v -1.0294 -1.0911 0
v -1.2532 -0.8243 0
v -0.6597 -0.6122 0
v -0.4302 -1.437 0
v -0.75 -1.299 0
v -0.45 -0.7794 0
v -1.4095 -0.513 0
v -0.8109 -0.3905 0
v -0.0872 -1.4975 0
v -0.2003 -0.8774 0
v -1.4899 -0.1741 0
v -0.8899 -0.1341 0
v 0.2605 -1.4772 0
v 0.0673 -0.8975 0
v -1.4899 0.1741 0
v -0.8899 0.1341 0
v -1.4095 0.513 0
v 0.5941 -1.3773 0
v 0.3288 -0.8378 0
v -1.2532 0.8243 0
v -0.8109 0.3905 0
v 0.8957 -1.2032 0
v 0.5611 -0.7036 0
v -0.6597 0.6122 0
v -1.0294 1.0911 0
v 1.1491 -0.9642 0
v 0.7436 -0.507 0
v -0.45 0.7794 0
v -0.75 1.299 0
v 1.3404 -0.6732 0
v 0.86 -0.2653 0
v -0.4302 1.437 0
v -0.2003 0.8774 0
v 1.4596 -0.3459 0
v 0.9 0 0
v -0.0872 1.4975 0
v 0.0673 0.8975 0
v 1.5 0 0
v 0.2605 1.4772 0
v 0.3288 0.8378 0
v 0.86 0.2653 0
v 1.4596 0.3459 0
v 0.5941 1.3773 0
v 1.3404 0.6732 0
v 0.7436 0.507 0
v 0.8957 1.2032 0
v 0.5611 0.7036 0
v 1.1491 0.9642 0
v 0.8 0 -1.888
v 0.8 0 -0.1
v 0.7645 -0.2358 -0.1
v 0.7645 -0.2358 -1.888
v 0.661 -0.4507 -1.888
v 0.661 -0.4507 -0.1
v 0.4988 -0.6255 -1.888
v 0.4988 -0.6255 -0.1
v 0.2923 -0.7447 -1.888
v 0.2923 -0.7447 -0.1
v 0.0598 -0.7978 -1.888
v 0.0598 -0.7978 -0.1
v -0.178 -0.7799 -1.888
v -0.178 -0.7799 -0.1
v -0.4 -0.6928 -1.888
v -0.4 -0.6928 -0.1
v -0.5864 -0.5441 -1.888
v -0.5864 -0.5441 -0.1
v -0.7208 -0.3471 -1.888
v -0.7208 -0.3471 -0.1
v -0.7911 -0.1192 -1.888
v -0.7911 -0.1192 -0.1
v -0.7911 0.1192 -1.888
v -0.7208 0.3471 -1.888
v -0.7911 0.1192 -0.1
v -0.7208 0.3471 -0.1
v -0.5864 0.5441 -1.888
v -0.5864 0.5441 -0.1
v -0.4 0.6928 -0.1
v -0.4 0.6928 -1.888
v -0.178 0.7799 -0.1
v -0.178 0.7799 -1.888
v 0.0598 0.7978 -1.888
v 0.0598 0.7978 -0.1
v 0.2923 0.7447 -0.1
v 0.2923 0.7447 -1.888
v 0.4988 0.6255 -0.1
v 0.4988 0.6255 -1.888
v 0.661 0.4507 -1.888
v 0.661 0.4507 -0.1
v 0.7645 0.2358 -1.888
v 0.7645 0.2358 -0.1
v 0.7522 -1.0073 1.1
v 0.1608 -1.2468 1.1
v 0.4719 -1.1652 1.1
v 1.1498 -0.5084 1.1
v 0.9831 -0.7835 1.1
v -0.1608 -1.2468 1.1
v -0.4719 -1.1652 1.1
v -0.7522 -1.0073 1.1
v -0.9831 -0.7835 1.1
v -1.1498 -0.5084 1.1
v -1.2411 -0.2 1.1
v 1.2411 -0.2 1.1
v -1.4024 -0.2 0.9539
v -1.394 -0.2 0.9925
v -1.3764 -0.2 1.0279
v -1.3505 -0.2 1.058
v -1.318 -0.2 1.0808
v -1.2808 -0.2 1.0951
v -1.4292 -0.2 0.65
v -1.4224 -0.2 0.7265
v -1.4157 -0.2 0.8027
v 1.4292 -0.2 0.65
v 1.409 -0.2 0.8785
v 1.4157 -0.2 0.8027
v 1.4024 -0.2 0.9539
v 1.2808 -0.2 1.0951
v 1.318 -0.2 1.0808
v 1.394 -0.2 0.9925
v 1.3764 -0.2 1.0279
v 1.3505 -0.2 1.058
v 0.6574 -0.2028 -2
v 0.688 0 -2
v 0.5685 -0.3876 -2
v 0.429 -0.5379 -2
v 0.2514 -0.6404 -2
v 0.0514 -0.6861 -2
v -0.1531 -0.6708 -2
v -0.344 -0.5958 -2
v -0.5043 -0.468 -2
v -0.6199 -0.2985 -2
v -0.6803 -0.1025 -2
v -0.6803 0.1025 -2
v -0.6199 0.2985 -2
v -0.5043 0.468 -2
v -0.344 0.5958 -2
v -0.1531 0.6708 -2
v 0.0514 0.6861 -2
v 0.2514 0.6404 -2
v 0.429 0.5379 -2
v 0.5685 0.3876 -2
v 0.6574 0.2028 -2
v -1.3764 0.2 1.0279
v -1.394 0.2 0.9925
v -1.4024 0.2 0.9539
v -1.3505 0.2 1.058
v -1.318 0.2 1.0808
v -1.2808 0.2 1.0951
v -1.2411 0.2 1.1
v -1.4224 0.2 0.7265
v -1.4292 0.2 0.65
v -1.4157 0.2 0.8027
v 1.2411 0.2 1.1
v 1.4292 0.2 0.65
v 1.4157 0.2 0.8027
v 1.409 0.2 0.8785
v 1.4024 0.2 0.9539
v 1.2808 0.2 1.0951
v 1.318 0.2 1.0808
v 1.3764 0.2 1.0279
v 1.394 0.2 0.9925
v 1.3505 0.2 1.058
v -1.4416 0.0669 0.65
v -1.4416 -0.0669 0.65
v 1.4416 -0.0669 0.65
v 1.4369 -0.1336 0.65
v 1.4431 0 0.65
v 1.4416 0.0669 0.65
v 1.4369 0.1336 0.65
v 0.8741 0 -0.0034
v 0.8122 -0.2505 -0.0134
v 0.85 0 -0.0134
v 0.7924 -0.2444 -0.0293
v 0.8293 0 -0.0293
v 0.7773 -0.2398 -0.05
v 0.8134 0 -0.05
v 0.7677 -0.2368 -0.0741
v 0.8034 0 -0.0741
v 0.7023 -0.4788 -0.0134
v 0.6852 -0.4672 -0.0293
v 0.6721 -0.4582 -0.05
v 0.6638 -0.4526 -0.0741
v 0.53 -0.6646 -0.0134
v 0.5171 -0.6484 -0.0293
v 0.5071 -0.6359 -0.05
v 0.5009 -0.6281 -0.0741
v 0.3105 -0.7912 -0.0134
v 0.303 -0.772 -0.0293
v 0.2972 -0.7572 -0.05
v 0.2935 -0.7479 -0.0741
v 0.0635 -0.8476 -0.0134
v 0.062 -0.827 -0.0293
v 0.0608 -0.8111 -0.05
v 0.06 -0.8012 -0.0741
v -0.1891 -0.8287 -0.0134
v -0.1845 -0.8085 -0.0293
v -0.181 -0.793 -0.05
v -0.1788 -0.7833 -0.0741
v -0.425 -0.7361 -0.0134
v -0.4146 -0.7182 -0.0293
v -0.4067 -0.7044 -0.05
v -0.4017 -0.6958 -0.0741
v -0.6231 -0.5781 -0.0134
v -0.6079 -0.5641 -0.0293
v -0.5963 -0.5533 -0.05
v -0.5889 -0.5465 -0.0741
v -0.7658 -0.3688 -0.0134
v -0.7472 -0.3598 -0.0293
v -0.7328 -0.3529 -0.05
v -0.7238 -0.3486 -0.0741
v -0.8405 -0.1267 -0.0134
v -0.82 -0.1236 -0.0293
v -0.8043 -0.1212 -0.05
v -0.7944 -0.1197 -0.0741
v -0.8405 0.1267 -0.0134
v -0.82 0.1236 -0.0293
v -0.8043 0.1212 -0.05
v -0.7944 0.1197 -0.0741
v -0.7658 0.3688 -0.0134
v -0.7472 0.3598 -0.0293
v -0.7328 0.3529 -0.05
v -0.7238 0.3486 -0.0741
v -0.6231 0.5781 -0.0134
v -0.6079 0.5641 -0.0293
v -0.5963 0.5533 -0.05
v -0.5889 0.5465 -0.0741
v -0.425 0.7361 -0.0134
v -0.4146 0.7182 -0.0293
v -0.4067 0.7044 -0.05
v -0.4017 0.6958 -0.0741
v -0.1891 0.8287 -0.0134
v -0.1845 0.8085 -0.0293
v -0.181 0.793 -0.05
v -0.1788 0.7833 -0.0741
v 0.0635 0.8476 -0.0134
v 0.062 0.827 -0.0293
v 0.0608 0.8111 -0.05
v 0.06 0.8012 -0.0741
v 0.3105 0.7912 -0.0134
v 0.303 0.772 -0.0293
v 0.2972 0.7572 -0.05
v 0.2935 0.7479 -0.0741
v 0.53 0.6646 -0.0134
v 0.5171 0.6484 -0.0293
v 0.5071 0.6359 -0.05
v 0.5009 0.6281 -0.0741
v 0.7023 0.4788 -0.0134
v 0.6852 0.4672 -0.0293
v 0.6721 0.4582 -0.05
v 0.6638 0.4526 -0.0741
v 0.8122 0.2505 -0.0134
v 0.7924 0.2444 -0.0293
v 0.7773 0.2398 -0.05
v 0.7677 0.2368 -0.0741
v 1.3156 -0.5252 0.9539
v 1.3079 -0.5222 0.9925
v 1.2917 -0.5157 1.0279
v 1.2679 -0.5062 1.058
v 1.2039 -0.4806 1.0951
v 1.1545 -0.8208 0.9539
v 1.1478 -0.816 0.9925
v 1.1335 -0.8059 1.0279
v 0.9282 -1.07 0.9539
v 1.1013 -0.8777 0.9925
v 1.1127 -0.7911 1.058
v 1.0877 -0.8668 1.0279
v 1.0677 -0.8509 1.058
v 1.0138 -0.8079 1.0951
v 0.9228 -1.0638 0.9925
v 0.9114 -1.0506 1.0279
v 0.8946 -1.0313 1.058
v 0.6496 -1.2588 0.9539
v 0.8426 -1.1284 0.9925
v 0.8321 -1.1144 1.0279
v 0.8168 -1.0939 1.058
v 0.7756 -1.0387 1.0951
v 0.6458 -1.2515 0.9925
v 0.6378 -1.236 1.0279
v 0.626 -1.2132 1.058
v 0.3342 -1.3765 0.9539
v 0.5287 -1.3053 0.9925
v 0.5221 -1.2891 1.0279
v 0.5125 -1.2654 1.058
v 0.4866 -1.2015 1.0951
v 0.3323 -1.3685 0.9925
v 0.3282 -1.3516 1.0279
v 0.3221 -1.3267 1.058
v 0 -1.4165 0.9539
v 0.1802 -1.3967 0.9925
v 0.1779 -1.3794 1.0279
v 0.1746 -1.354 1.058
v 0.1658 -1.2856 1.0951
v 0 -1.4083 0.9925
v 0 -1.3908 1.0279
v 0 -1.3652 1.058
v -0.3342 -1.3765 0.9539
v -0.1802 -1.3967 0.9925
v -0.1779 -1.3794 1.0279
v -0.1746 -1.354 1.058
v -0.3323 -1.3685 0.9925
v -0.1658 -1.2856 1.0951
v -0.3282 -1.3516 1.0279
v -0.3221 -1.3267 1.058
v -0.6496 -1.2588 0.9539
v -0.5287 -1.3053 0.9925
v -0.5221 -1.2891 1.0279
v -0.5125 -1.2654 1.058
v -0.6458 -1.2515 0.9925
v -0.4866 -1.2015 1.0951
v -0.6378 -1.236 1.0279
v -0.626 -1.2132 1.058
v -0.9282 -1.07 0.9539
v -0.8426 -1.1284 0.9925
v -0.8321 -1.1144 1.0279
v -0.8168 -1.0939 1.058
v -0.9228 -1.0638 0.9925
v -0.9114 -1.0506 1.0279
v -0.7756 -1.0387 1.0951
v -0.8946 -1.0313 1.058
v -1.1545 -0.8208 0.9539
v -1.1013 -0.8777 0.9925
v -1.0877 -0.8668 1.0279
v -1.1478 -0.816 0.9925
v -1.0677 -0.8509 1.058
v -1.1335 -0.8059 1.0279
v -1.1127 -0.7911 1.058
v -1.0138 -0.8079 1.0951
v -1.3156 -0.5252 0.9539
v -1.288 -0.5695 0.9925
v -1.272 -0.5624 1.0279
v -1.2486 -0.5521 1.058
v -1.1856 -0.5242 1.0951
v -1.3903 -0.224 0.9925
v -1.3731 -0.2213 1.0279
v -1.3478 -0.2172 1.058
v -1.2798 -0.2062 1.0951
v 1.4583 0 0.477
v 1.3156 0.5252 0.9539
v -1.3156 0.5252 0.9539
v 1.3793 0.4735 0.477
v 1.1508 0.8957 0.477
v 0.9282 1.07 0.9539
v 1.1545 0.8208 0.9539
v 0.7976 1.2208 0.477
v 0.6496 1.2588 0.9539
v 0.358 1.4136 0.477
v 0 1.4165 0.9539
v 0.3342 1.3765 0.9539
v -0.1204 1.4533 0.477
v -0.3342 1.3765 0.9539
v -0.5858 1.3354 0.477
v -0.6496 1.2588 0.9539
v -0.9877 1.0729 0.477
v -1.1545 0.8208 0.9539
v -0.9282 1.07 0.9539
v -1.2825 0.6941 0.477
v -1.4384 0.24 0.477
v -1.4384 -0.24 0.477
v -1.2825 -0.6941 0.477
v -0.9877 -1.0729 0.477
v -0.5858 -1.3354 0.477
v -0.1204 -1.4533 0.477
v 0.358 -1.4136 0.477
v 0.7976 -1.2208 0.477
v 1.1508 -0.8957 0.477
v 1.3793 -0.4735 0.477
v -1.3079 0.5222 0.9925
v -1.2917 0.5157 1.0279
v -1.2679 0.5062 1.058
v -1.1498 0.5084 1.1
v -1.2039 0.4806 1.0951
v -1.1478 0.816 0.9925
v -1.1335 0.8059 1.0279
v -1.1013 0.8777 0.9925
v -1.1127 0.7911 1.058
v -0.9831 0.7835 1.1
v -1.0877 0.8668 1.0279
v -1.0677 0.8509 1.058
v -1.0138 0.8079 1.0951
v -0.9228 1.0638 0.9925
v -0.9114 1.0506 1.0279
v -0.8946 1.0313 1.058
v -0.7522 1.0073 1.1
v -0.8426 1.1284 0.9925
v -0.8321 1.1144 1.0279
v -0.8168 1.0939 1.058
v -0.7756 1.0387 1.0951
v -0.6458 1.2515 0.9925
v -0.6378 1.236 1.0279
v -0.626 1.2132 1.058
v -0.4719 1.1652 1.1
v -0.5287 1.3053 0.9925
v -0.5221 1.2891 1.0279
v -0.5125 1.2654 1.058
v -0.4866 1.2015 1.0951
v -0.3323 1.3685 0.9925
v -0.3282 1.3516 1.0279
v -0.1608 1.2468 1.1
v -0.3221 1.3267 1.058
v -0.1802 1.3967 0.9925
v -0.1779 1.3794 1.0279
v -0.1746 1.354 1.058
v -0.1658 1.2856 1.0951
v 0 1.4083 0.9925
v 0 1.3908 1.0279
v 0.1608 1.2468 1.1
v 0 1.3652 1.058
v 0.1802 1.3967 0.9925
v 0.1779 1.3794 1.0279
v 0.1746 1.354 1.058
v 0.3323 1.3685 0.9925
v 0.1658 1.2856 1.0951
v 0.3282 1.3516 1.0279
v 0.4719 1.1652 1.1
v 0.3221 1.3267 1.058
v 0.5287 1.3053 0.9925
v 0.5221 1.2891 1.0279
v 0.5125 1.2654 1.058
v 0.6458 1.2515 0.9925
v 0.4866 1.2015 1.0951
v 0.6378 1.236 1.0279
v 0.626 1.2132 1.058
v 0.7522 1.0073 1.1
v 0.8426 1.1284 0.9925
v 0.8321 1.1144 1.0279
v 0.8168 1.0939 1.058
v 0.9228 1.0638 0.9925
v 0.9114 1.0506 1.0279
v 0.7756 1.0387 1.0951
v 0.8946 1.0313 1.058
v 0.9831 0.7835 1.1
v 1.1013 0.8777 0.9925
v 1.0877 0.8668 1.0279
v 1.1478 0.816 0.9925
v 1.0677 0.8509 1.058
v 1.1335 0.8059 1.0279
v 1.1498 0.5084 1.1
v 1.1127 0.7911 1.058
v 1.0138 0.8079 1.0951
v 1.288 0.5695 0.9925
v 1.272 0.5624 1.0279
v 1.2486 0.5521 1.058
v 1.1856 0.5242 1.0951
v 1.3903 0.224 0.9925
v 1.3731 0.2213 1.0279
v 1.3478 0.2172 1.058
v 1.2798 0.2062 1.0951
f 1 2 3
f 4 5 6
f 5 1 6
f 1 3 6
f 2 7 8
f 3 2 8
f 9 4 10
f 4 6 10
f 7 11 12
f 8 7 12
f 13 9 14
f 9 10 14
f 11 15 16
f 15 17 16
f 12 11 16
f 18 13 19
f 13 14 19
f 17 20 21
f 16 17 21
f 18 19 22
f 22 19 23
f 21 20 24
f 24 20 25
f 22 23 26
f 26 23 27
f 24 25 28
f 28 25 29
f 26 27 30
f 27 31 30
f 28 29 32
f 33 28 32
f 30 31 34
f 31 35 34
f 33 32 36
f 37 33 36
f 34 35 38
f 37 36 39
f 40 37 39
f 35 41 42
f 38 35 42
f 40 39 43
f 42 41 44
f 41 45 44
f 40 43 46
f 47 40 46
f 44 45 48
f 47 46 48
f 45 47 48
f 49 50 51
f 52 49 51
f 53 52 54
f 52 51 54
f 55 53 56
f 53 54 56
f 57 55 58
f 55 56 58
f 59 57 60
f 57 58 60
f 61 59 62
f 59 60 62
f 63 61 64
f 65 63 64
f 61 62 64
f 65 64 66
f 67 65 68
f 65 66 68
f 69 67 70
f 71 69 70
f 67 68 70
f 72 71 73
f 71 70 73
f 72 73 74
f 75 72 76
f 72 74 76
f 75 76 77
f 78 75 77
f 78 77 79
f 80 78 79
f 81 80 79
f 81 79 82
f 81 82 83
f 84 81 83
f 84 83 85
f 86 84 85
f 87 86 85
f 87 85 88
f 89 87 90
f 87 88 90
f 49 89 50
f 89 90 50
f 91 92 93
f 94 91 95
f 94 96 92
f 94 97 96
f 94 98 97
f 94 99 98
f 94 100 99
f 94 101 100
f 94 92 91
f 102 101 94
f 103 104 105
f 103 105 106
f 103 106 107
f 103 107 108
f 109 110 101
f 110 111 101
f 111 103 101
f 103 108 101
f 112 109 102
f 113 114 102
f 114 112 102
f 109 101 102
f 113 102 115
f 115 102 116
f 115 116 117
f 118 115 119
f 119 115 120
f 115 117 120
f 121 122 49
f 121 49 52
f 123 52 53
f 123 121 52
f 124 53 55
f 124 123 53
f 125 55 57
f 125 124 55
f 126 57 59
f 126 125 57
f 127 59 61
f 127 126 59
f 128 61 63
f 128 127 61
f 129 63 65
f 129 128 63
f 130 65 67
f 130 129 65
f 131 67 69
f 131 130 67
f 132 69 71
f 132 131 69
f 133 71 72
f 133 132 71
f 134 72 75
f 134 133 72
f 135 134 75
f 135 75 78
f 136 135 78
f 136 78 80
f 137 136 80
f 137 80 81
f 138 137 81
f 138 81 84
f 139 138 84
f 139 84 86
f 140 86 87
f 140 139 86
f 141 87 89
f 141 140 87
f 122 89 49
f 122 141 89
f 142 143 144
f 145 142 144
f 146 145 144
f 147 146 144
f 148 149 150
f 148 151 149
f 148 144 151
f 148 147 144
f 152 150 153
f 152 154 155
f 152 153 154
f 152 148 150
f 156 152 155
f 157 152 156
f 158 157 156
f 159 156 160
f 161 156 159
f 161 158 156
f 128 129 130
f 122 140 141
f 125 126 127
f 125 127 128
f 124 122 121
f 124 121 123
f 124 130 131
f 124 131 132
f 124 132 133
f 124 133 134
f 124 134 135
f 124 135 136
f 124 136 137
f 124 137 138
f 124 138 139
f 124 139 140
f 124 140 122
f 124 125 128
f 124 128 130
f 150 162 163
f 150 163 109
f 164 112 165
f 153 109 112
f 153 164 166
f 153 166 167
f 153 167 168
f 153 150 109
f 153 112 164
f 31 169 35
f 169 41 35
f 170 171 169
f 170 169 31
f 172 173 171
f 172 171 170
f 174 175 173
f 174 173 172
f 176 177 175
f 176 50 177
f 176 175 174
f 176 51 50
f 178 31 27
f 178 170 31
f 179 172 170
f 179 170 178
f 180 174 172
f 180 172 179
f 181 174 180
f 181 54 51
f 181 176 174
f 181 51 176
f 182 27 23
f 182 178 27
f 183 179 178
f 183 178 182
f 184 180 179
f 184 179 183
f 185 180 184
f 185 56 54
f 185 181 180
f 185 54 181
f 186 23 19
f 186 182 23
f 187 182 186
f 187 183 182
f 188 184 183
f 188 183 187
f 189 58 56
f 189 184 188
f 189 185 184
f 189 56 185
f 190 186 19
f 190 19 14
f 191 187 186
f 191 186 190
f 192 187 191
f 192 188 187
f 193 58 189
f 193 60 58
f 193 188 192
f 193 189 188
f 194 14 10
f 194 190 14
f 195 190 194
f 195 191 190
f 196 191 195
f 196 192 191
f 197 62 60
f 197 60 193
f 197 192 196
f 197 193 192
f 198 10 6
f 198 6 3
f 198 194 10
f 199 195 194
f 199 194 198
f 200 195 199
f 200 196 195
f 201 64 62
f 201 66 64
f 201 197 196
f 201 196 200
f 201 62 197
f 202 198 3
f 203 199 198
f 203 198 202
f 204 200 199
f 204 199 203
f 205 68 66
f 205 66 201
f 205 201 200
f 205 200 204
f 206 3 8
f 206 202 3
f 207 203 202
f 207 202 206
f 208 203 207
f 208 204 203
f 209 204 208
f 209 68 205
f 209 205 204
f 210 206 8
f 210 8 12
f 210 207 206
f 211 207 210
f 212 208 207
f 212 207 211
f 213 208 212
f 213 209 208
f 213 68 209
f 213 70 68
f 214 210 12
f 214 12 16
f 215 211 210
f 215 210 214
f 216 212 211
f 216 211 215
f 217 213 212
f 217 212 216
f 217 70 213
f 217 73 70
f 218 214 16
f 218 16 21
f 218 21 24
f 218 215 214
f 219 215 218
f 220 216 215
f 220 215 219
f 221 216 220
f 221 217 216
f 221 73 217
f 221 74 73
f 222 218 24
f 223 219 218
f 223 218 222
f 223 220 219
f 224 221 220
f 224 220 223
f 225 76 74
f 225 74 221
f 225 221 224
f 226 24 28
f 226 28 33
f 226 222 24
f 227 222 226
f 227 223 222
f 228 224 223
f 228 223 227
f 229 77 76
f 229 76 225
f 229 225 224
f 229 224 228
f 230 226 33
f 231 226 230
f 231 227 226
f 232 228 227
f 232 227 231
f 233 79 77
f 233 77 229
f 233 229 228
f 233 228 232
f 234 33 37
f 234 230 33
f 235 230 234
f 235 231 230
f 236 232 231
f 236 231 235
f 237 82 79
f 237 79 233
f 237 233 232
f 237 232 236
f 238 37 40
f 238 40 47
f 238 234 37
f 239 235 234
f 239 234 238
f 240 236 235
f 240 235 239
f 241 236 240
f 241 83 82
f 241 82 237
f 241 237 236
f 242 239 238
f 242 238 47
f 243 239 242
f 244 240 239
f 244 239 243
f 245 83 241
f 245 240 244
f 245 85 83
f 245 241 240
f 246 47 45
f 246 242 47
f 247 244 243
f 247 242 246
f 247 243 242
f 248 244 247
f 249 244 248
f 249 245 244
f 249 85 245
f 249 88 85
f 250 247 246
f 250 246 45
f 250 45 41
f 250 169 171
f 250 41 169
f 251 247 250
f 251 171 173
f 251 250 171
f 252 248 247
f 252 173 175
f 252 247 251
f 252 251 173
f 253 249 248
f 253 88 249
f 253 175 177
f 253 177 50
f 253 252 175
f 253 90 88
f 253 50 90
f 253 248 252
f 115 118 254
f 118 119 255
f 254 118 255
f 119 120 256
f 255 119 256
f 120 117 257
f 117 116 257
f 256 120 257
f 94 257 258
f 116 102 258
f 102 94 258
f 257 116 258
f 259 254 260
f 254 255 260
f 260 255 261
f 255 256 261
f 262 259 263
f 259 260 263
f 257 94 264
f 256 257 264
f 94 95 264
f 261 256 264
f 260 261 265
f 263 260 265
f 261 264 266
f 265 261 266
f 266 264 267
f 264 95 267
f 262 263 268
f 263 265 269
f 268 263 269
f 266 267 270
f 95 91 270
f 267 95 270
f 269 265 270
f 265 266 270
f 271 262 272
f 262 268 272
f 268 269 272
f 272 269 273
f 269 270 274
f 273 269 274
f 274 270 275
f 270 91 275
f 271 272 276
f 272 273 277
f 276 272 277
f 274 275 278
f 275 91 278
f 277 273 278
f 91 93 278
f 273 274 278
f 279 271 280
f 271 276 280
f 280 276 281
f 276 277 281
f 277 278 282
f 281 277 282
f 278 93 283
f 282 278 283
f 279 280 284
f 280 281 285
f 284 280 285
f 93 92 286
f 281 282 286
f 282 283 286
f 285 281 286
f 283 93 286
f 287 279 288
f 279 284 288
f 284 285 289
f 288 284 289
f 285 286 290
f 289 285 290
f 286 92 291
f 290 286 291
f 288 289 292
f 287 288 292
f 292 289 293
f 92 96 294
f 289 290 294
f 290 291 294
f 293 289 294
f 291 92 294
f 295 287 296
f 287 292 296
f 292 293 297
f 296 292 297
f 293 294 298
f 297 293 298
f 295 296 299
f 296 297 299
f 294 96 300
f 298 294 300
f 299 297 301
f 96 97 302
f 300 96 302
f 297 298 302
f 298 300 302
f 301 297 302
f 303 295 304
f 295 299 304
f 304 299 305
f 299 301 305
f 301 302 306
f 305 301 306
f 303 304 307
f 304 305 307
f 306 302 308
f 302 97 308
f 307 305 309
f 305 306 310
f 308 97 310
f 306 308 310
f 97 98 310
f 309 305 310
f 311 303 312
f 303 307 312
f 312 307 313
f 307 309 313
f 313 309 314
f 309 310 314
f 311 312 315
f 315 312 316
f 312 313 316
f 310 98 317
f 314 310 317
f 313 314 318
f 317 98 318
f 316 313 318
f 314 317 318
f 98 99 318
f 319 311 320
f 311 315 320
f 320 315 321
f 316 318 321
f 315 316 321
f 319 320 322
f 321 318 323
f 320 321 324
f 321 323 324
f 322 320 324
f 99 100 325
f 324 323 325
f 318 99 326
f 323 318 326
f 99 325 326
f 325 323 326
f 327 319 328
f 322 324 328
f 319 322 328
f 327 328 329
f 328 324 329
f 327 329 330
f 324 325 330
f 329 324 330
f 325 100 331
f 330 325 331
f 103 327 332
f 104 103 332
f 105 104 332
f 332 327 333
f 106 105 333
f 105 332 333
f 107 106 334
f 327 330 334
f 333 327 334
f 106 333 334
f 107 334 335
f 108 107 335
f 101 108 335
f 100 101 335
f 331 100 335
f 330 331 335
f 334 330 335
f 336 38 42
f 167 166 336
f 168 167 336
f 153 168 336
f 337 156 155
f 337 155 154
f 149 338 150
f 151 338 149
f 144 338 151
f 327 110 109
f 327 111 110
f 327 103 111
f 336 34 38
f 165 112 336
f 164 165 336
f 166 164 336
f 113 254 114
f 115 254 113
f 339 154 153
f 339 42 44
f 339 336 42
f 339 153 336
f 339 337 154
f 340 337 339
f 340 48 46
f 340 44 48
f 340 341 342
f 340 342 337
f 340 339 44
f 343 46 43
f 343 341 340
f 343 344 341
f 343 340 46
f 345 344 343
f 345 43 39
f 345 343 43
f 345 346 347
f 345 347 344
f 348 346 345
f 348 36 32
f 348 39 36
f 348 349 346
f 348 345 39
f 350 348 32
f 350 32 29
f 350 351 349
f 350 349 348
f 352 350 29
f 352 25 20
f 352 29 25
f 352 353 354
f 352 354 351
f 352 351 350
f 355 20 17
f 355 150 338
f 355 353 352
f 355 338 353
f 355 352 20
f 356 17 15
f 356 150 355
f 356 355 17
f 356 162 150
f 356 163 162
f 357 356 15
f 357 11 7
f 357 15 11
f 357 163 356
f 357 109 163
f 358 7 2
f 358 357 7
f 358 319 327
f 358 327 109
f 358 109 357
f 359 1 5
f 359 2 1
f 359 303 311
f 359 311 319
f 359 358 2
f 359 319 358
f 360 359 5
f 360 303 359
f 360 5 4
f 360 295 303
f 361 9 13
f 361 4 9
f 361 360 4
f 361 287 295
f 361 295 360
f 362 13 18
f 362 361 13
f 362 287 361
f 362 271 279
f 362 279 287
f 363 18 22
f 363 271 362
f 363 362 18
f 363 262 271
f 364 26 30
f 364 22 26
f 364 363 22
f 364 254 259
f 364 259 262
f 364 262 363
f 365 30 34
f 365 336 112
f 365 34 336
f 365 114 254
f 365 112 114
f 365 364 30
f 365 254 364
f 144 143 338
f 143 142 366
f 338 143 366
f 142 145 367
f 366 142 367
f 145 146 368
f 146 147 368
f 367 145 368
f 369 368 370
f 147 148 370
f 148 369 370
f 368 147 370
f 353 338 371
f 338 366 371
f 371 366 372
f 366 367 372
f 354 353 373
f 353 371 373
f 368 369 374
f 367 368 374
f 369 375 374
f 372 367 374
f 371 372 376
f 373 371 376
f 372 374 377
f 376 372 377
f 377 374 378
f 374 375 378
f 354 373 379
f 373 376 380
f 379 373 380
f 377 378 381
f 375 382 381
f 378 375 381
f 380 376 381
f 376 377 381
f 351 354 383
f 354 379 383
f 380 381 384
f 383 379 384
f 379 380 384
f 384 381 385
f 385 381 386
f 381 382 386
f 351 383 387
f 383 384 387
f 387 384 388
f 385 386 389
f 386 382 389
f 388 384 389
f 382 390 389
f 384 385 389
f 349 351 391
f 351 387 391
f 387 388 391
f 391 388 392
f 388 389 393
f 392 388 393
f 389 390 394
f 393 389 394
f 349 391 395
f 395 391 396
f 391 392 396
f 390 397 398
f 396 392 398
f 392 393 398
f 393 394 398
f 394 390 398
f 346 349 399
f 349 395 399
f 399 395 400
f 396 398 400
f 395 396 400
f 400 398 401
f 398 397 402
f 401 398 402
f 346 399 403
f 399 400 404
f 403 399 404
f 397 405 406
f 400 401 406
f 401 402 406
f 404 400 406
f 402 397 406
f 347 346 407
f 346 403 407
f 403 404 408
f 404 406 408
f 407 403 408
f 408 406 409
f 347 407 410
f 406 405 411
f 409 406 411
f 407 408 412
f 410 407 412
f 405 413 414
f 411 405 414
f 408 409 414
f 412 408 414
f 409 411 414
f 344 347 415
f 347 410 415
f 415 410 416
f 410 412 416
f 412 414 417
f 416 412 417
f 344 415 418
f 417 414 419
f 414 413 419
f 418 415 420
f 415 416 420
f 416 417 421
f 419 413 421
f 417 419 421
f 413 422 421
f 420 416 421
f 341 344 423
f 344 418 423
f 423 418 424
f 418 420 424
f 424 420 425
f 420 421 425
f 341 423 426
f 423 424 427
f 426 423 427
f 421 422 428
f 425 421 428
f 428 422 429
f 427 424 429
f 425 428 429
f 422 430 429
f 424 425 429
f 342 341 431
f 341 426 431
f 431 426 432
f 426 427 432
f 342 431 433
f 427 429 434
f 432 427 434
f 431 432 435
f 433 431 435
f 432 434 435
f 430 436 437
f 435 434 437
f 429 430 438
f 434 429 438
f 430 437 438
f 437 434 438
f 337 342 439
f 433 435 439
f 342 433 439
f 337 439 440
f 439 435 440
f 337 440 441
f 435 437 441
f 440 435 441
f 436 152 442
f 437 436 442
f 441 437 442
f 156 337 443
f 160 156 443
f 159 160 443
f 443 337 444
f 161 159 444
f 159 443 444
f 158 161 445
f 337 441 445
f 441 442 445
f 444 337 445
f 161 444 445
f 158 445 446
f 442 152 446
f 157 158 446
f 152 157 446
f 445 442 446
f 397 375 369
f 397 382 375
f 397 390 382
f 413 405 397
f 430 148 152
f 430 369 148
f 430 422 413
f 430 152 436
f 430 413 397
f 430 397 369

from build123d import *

# Parameters (mm, degrees)
SKICA1_R                 = 1.5
VYSUNOUT1_DEPTH          = 1.1
VYSUNOUT1_TAPER          = 5
SKICA2_W                 = 3
SKICA2_H                 = 0.4
ODEBRAT_VYSUNUT_M1_DEPTH = 0.45
SKICA3_R                 = 0.8
VYSUNOUT2_DEPTH          = 2
ZAOBLIT1_R               = 0.1
ZKOSIT1_SIZE             = 0.112
ZAOBLIT2_R               = 0.16


with BuildPart() as part:
    # Skica1 → Vysunout1 (new body)
    with BuildSketch(Plane.XY):
        Circle(SKICA1_R)
    extrude(amount=VYSUNOUT1_DEPTH, taper=VYSUNOUT1_TAPER)

    # Skica2 → Odebrat vysunutím1 (cut)
    with BuildSketch(Plane.XY.offset(1.1)):
        Rectangle(SKICA2_W, SKICA2_H)
    extrude(amount=-ODEBRAT_VYSUNUT_M1_DEPTH, mode=Mode.SUBTRACT)

    # Skica3 → Vysunout2 (add)
    with BuildSketch(Plane(origin=(0, 0, 0), x_dir=(-1, 0, 0), z_dir=(0, 0, -1))):
        with Locations(Location((0, 0, 0), (0, 0, 180))):
            Circle(SKICA3_R)
    extrude(amount=VYSUNOUT2_DEPTH)

    # Zaoblit1
    zaoblit1_edges = [part.edges().sort_by_distance(p)[0] for p in [
        (-0.8, 0, 0),
    ]]
    fillet(zaoblit1_edges, radius=ZAOBLIT1_R)

    # Zkosit1
    zkosit1_edges = [part.edges().sort_by_distance(p)[0] for p in [
        (-0.8, 0, -2),
    ]]
    chamfer(zkosit1_edges, length=ZKOSIT1_SIZE)

    # Zaoblit2
    zaoblit2_edges = [part.edges().sort_by_distance(p)[0] for p in [
        (0, 1.40376247, 1.1),
        (0, -1.40376247, 1.1),
    ]]
    fillet(zaoblit2_edges, radius=ZAOBLIT2_R)


solid = part.part
